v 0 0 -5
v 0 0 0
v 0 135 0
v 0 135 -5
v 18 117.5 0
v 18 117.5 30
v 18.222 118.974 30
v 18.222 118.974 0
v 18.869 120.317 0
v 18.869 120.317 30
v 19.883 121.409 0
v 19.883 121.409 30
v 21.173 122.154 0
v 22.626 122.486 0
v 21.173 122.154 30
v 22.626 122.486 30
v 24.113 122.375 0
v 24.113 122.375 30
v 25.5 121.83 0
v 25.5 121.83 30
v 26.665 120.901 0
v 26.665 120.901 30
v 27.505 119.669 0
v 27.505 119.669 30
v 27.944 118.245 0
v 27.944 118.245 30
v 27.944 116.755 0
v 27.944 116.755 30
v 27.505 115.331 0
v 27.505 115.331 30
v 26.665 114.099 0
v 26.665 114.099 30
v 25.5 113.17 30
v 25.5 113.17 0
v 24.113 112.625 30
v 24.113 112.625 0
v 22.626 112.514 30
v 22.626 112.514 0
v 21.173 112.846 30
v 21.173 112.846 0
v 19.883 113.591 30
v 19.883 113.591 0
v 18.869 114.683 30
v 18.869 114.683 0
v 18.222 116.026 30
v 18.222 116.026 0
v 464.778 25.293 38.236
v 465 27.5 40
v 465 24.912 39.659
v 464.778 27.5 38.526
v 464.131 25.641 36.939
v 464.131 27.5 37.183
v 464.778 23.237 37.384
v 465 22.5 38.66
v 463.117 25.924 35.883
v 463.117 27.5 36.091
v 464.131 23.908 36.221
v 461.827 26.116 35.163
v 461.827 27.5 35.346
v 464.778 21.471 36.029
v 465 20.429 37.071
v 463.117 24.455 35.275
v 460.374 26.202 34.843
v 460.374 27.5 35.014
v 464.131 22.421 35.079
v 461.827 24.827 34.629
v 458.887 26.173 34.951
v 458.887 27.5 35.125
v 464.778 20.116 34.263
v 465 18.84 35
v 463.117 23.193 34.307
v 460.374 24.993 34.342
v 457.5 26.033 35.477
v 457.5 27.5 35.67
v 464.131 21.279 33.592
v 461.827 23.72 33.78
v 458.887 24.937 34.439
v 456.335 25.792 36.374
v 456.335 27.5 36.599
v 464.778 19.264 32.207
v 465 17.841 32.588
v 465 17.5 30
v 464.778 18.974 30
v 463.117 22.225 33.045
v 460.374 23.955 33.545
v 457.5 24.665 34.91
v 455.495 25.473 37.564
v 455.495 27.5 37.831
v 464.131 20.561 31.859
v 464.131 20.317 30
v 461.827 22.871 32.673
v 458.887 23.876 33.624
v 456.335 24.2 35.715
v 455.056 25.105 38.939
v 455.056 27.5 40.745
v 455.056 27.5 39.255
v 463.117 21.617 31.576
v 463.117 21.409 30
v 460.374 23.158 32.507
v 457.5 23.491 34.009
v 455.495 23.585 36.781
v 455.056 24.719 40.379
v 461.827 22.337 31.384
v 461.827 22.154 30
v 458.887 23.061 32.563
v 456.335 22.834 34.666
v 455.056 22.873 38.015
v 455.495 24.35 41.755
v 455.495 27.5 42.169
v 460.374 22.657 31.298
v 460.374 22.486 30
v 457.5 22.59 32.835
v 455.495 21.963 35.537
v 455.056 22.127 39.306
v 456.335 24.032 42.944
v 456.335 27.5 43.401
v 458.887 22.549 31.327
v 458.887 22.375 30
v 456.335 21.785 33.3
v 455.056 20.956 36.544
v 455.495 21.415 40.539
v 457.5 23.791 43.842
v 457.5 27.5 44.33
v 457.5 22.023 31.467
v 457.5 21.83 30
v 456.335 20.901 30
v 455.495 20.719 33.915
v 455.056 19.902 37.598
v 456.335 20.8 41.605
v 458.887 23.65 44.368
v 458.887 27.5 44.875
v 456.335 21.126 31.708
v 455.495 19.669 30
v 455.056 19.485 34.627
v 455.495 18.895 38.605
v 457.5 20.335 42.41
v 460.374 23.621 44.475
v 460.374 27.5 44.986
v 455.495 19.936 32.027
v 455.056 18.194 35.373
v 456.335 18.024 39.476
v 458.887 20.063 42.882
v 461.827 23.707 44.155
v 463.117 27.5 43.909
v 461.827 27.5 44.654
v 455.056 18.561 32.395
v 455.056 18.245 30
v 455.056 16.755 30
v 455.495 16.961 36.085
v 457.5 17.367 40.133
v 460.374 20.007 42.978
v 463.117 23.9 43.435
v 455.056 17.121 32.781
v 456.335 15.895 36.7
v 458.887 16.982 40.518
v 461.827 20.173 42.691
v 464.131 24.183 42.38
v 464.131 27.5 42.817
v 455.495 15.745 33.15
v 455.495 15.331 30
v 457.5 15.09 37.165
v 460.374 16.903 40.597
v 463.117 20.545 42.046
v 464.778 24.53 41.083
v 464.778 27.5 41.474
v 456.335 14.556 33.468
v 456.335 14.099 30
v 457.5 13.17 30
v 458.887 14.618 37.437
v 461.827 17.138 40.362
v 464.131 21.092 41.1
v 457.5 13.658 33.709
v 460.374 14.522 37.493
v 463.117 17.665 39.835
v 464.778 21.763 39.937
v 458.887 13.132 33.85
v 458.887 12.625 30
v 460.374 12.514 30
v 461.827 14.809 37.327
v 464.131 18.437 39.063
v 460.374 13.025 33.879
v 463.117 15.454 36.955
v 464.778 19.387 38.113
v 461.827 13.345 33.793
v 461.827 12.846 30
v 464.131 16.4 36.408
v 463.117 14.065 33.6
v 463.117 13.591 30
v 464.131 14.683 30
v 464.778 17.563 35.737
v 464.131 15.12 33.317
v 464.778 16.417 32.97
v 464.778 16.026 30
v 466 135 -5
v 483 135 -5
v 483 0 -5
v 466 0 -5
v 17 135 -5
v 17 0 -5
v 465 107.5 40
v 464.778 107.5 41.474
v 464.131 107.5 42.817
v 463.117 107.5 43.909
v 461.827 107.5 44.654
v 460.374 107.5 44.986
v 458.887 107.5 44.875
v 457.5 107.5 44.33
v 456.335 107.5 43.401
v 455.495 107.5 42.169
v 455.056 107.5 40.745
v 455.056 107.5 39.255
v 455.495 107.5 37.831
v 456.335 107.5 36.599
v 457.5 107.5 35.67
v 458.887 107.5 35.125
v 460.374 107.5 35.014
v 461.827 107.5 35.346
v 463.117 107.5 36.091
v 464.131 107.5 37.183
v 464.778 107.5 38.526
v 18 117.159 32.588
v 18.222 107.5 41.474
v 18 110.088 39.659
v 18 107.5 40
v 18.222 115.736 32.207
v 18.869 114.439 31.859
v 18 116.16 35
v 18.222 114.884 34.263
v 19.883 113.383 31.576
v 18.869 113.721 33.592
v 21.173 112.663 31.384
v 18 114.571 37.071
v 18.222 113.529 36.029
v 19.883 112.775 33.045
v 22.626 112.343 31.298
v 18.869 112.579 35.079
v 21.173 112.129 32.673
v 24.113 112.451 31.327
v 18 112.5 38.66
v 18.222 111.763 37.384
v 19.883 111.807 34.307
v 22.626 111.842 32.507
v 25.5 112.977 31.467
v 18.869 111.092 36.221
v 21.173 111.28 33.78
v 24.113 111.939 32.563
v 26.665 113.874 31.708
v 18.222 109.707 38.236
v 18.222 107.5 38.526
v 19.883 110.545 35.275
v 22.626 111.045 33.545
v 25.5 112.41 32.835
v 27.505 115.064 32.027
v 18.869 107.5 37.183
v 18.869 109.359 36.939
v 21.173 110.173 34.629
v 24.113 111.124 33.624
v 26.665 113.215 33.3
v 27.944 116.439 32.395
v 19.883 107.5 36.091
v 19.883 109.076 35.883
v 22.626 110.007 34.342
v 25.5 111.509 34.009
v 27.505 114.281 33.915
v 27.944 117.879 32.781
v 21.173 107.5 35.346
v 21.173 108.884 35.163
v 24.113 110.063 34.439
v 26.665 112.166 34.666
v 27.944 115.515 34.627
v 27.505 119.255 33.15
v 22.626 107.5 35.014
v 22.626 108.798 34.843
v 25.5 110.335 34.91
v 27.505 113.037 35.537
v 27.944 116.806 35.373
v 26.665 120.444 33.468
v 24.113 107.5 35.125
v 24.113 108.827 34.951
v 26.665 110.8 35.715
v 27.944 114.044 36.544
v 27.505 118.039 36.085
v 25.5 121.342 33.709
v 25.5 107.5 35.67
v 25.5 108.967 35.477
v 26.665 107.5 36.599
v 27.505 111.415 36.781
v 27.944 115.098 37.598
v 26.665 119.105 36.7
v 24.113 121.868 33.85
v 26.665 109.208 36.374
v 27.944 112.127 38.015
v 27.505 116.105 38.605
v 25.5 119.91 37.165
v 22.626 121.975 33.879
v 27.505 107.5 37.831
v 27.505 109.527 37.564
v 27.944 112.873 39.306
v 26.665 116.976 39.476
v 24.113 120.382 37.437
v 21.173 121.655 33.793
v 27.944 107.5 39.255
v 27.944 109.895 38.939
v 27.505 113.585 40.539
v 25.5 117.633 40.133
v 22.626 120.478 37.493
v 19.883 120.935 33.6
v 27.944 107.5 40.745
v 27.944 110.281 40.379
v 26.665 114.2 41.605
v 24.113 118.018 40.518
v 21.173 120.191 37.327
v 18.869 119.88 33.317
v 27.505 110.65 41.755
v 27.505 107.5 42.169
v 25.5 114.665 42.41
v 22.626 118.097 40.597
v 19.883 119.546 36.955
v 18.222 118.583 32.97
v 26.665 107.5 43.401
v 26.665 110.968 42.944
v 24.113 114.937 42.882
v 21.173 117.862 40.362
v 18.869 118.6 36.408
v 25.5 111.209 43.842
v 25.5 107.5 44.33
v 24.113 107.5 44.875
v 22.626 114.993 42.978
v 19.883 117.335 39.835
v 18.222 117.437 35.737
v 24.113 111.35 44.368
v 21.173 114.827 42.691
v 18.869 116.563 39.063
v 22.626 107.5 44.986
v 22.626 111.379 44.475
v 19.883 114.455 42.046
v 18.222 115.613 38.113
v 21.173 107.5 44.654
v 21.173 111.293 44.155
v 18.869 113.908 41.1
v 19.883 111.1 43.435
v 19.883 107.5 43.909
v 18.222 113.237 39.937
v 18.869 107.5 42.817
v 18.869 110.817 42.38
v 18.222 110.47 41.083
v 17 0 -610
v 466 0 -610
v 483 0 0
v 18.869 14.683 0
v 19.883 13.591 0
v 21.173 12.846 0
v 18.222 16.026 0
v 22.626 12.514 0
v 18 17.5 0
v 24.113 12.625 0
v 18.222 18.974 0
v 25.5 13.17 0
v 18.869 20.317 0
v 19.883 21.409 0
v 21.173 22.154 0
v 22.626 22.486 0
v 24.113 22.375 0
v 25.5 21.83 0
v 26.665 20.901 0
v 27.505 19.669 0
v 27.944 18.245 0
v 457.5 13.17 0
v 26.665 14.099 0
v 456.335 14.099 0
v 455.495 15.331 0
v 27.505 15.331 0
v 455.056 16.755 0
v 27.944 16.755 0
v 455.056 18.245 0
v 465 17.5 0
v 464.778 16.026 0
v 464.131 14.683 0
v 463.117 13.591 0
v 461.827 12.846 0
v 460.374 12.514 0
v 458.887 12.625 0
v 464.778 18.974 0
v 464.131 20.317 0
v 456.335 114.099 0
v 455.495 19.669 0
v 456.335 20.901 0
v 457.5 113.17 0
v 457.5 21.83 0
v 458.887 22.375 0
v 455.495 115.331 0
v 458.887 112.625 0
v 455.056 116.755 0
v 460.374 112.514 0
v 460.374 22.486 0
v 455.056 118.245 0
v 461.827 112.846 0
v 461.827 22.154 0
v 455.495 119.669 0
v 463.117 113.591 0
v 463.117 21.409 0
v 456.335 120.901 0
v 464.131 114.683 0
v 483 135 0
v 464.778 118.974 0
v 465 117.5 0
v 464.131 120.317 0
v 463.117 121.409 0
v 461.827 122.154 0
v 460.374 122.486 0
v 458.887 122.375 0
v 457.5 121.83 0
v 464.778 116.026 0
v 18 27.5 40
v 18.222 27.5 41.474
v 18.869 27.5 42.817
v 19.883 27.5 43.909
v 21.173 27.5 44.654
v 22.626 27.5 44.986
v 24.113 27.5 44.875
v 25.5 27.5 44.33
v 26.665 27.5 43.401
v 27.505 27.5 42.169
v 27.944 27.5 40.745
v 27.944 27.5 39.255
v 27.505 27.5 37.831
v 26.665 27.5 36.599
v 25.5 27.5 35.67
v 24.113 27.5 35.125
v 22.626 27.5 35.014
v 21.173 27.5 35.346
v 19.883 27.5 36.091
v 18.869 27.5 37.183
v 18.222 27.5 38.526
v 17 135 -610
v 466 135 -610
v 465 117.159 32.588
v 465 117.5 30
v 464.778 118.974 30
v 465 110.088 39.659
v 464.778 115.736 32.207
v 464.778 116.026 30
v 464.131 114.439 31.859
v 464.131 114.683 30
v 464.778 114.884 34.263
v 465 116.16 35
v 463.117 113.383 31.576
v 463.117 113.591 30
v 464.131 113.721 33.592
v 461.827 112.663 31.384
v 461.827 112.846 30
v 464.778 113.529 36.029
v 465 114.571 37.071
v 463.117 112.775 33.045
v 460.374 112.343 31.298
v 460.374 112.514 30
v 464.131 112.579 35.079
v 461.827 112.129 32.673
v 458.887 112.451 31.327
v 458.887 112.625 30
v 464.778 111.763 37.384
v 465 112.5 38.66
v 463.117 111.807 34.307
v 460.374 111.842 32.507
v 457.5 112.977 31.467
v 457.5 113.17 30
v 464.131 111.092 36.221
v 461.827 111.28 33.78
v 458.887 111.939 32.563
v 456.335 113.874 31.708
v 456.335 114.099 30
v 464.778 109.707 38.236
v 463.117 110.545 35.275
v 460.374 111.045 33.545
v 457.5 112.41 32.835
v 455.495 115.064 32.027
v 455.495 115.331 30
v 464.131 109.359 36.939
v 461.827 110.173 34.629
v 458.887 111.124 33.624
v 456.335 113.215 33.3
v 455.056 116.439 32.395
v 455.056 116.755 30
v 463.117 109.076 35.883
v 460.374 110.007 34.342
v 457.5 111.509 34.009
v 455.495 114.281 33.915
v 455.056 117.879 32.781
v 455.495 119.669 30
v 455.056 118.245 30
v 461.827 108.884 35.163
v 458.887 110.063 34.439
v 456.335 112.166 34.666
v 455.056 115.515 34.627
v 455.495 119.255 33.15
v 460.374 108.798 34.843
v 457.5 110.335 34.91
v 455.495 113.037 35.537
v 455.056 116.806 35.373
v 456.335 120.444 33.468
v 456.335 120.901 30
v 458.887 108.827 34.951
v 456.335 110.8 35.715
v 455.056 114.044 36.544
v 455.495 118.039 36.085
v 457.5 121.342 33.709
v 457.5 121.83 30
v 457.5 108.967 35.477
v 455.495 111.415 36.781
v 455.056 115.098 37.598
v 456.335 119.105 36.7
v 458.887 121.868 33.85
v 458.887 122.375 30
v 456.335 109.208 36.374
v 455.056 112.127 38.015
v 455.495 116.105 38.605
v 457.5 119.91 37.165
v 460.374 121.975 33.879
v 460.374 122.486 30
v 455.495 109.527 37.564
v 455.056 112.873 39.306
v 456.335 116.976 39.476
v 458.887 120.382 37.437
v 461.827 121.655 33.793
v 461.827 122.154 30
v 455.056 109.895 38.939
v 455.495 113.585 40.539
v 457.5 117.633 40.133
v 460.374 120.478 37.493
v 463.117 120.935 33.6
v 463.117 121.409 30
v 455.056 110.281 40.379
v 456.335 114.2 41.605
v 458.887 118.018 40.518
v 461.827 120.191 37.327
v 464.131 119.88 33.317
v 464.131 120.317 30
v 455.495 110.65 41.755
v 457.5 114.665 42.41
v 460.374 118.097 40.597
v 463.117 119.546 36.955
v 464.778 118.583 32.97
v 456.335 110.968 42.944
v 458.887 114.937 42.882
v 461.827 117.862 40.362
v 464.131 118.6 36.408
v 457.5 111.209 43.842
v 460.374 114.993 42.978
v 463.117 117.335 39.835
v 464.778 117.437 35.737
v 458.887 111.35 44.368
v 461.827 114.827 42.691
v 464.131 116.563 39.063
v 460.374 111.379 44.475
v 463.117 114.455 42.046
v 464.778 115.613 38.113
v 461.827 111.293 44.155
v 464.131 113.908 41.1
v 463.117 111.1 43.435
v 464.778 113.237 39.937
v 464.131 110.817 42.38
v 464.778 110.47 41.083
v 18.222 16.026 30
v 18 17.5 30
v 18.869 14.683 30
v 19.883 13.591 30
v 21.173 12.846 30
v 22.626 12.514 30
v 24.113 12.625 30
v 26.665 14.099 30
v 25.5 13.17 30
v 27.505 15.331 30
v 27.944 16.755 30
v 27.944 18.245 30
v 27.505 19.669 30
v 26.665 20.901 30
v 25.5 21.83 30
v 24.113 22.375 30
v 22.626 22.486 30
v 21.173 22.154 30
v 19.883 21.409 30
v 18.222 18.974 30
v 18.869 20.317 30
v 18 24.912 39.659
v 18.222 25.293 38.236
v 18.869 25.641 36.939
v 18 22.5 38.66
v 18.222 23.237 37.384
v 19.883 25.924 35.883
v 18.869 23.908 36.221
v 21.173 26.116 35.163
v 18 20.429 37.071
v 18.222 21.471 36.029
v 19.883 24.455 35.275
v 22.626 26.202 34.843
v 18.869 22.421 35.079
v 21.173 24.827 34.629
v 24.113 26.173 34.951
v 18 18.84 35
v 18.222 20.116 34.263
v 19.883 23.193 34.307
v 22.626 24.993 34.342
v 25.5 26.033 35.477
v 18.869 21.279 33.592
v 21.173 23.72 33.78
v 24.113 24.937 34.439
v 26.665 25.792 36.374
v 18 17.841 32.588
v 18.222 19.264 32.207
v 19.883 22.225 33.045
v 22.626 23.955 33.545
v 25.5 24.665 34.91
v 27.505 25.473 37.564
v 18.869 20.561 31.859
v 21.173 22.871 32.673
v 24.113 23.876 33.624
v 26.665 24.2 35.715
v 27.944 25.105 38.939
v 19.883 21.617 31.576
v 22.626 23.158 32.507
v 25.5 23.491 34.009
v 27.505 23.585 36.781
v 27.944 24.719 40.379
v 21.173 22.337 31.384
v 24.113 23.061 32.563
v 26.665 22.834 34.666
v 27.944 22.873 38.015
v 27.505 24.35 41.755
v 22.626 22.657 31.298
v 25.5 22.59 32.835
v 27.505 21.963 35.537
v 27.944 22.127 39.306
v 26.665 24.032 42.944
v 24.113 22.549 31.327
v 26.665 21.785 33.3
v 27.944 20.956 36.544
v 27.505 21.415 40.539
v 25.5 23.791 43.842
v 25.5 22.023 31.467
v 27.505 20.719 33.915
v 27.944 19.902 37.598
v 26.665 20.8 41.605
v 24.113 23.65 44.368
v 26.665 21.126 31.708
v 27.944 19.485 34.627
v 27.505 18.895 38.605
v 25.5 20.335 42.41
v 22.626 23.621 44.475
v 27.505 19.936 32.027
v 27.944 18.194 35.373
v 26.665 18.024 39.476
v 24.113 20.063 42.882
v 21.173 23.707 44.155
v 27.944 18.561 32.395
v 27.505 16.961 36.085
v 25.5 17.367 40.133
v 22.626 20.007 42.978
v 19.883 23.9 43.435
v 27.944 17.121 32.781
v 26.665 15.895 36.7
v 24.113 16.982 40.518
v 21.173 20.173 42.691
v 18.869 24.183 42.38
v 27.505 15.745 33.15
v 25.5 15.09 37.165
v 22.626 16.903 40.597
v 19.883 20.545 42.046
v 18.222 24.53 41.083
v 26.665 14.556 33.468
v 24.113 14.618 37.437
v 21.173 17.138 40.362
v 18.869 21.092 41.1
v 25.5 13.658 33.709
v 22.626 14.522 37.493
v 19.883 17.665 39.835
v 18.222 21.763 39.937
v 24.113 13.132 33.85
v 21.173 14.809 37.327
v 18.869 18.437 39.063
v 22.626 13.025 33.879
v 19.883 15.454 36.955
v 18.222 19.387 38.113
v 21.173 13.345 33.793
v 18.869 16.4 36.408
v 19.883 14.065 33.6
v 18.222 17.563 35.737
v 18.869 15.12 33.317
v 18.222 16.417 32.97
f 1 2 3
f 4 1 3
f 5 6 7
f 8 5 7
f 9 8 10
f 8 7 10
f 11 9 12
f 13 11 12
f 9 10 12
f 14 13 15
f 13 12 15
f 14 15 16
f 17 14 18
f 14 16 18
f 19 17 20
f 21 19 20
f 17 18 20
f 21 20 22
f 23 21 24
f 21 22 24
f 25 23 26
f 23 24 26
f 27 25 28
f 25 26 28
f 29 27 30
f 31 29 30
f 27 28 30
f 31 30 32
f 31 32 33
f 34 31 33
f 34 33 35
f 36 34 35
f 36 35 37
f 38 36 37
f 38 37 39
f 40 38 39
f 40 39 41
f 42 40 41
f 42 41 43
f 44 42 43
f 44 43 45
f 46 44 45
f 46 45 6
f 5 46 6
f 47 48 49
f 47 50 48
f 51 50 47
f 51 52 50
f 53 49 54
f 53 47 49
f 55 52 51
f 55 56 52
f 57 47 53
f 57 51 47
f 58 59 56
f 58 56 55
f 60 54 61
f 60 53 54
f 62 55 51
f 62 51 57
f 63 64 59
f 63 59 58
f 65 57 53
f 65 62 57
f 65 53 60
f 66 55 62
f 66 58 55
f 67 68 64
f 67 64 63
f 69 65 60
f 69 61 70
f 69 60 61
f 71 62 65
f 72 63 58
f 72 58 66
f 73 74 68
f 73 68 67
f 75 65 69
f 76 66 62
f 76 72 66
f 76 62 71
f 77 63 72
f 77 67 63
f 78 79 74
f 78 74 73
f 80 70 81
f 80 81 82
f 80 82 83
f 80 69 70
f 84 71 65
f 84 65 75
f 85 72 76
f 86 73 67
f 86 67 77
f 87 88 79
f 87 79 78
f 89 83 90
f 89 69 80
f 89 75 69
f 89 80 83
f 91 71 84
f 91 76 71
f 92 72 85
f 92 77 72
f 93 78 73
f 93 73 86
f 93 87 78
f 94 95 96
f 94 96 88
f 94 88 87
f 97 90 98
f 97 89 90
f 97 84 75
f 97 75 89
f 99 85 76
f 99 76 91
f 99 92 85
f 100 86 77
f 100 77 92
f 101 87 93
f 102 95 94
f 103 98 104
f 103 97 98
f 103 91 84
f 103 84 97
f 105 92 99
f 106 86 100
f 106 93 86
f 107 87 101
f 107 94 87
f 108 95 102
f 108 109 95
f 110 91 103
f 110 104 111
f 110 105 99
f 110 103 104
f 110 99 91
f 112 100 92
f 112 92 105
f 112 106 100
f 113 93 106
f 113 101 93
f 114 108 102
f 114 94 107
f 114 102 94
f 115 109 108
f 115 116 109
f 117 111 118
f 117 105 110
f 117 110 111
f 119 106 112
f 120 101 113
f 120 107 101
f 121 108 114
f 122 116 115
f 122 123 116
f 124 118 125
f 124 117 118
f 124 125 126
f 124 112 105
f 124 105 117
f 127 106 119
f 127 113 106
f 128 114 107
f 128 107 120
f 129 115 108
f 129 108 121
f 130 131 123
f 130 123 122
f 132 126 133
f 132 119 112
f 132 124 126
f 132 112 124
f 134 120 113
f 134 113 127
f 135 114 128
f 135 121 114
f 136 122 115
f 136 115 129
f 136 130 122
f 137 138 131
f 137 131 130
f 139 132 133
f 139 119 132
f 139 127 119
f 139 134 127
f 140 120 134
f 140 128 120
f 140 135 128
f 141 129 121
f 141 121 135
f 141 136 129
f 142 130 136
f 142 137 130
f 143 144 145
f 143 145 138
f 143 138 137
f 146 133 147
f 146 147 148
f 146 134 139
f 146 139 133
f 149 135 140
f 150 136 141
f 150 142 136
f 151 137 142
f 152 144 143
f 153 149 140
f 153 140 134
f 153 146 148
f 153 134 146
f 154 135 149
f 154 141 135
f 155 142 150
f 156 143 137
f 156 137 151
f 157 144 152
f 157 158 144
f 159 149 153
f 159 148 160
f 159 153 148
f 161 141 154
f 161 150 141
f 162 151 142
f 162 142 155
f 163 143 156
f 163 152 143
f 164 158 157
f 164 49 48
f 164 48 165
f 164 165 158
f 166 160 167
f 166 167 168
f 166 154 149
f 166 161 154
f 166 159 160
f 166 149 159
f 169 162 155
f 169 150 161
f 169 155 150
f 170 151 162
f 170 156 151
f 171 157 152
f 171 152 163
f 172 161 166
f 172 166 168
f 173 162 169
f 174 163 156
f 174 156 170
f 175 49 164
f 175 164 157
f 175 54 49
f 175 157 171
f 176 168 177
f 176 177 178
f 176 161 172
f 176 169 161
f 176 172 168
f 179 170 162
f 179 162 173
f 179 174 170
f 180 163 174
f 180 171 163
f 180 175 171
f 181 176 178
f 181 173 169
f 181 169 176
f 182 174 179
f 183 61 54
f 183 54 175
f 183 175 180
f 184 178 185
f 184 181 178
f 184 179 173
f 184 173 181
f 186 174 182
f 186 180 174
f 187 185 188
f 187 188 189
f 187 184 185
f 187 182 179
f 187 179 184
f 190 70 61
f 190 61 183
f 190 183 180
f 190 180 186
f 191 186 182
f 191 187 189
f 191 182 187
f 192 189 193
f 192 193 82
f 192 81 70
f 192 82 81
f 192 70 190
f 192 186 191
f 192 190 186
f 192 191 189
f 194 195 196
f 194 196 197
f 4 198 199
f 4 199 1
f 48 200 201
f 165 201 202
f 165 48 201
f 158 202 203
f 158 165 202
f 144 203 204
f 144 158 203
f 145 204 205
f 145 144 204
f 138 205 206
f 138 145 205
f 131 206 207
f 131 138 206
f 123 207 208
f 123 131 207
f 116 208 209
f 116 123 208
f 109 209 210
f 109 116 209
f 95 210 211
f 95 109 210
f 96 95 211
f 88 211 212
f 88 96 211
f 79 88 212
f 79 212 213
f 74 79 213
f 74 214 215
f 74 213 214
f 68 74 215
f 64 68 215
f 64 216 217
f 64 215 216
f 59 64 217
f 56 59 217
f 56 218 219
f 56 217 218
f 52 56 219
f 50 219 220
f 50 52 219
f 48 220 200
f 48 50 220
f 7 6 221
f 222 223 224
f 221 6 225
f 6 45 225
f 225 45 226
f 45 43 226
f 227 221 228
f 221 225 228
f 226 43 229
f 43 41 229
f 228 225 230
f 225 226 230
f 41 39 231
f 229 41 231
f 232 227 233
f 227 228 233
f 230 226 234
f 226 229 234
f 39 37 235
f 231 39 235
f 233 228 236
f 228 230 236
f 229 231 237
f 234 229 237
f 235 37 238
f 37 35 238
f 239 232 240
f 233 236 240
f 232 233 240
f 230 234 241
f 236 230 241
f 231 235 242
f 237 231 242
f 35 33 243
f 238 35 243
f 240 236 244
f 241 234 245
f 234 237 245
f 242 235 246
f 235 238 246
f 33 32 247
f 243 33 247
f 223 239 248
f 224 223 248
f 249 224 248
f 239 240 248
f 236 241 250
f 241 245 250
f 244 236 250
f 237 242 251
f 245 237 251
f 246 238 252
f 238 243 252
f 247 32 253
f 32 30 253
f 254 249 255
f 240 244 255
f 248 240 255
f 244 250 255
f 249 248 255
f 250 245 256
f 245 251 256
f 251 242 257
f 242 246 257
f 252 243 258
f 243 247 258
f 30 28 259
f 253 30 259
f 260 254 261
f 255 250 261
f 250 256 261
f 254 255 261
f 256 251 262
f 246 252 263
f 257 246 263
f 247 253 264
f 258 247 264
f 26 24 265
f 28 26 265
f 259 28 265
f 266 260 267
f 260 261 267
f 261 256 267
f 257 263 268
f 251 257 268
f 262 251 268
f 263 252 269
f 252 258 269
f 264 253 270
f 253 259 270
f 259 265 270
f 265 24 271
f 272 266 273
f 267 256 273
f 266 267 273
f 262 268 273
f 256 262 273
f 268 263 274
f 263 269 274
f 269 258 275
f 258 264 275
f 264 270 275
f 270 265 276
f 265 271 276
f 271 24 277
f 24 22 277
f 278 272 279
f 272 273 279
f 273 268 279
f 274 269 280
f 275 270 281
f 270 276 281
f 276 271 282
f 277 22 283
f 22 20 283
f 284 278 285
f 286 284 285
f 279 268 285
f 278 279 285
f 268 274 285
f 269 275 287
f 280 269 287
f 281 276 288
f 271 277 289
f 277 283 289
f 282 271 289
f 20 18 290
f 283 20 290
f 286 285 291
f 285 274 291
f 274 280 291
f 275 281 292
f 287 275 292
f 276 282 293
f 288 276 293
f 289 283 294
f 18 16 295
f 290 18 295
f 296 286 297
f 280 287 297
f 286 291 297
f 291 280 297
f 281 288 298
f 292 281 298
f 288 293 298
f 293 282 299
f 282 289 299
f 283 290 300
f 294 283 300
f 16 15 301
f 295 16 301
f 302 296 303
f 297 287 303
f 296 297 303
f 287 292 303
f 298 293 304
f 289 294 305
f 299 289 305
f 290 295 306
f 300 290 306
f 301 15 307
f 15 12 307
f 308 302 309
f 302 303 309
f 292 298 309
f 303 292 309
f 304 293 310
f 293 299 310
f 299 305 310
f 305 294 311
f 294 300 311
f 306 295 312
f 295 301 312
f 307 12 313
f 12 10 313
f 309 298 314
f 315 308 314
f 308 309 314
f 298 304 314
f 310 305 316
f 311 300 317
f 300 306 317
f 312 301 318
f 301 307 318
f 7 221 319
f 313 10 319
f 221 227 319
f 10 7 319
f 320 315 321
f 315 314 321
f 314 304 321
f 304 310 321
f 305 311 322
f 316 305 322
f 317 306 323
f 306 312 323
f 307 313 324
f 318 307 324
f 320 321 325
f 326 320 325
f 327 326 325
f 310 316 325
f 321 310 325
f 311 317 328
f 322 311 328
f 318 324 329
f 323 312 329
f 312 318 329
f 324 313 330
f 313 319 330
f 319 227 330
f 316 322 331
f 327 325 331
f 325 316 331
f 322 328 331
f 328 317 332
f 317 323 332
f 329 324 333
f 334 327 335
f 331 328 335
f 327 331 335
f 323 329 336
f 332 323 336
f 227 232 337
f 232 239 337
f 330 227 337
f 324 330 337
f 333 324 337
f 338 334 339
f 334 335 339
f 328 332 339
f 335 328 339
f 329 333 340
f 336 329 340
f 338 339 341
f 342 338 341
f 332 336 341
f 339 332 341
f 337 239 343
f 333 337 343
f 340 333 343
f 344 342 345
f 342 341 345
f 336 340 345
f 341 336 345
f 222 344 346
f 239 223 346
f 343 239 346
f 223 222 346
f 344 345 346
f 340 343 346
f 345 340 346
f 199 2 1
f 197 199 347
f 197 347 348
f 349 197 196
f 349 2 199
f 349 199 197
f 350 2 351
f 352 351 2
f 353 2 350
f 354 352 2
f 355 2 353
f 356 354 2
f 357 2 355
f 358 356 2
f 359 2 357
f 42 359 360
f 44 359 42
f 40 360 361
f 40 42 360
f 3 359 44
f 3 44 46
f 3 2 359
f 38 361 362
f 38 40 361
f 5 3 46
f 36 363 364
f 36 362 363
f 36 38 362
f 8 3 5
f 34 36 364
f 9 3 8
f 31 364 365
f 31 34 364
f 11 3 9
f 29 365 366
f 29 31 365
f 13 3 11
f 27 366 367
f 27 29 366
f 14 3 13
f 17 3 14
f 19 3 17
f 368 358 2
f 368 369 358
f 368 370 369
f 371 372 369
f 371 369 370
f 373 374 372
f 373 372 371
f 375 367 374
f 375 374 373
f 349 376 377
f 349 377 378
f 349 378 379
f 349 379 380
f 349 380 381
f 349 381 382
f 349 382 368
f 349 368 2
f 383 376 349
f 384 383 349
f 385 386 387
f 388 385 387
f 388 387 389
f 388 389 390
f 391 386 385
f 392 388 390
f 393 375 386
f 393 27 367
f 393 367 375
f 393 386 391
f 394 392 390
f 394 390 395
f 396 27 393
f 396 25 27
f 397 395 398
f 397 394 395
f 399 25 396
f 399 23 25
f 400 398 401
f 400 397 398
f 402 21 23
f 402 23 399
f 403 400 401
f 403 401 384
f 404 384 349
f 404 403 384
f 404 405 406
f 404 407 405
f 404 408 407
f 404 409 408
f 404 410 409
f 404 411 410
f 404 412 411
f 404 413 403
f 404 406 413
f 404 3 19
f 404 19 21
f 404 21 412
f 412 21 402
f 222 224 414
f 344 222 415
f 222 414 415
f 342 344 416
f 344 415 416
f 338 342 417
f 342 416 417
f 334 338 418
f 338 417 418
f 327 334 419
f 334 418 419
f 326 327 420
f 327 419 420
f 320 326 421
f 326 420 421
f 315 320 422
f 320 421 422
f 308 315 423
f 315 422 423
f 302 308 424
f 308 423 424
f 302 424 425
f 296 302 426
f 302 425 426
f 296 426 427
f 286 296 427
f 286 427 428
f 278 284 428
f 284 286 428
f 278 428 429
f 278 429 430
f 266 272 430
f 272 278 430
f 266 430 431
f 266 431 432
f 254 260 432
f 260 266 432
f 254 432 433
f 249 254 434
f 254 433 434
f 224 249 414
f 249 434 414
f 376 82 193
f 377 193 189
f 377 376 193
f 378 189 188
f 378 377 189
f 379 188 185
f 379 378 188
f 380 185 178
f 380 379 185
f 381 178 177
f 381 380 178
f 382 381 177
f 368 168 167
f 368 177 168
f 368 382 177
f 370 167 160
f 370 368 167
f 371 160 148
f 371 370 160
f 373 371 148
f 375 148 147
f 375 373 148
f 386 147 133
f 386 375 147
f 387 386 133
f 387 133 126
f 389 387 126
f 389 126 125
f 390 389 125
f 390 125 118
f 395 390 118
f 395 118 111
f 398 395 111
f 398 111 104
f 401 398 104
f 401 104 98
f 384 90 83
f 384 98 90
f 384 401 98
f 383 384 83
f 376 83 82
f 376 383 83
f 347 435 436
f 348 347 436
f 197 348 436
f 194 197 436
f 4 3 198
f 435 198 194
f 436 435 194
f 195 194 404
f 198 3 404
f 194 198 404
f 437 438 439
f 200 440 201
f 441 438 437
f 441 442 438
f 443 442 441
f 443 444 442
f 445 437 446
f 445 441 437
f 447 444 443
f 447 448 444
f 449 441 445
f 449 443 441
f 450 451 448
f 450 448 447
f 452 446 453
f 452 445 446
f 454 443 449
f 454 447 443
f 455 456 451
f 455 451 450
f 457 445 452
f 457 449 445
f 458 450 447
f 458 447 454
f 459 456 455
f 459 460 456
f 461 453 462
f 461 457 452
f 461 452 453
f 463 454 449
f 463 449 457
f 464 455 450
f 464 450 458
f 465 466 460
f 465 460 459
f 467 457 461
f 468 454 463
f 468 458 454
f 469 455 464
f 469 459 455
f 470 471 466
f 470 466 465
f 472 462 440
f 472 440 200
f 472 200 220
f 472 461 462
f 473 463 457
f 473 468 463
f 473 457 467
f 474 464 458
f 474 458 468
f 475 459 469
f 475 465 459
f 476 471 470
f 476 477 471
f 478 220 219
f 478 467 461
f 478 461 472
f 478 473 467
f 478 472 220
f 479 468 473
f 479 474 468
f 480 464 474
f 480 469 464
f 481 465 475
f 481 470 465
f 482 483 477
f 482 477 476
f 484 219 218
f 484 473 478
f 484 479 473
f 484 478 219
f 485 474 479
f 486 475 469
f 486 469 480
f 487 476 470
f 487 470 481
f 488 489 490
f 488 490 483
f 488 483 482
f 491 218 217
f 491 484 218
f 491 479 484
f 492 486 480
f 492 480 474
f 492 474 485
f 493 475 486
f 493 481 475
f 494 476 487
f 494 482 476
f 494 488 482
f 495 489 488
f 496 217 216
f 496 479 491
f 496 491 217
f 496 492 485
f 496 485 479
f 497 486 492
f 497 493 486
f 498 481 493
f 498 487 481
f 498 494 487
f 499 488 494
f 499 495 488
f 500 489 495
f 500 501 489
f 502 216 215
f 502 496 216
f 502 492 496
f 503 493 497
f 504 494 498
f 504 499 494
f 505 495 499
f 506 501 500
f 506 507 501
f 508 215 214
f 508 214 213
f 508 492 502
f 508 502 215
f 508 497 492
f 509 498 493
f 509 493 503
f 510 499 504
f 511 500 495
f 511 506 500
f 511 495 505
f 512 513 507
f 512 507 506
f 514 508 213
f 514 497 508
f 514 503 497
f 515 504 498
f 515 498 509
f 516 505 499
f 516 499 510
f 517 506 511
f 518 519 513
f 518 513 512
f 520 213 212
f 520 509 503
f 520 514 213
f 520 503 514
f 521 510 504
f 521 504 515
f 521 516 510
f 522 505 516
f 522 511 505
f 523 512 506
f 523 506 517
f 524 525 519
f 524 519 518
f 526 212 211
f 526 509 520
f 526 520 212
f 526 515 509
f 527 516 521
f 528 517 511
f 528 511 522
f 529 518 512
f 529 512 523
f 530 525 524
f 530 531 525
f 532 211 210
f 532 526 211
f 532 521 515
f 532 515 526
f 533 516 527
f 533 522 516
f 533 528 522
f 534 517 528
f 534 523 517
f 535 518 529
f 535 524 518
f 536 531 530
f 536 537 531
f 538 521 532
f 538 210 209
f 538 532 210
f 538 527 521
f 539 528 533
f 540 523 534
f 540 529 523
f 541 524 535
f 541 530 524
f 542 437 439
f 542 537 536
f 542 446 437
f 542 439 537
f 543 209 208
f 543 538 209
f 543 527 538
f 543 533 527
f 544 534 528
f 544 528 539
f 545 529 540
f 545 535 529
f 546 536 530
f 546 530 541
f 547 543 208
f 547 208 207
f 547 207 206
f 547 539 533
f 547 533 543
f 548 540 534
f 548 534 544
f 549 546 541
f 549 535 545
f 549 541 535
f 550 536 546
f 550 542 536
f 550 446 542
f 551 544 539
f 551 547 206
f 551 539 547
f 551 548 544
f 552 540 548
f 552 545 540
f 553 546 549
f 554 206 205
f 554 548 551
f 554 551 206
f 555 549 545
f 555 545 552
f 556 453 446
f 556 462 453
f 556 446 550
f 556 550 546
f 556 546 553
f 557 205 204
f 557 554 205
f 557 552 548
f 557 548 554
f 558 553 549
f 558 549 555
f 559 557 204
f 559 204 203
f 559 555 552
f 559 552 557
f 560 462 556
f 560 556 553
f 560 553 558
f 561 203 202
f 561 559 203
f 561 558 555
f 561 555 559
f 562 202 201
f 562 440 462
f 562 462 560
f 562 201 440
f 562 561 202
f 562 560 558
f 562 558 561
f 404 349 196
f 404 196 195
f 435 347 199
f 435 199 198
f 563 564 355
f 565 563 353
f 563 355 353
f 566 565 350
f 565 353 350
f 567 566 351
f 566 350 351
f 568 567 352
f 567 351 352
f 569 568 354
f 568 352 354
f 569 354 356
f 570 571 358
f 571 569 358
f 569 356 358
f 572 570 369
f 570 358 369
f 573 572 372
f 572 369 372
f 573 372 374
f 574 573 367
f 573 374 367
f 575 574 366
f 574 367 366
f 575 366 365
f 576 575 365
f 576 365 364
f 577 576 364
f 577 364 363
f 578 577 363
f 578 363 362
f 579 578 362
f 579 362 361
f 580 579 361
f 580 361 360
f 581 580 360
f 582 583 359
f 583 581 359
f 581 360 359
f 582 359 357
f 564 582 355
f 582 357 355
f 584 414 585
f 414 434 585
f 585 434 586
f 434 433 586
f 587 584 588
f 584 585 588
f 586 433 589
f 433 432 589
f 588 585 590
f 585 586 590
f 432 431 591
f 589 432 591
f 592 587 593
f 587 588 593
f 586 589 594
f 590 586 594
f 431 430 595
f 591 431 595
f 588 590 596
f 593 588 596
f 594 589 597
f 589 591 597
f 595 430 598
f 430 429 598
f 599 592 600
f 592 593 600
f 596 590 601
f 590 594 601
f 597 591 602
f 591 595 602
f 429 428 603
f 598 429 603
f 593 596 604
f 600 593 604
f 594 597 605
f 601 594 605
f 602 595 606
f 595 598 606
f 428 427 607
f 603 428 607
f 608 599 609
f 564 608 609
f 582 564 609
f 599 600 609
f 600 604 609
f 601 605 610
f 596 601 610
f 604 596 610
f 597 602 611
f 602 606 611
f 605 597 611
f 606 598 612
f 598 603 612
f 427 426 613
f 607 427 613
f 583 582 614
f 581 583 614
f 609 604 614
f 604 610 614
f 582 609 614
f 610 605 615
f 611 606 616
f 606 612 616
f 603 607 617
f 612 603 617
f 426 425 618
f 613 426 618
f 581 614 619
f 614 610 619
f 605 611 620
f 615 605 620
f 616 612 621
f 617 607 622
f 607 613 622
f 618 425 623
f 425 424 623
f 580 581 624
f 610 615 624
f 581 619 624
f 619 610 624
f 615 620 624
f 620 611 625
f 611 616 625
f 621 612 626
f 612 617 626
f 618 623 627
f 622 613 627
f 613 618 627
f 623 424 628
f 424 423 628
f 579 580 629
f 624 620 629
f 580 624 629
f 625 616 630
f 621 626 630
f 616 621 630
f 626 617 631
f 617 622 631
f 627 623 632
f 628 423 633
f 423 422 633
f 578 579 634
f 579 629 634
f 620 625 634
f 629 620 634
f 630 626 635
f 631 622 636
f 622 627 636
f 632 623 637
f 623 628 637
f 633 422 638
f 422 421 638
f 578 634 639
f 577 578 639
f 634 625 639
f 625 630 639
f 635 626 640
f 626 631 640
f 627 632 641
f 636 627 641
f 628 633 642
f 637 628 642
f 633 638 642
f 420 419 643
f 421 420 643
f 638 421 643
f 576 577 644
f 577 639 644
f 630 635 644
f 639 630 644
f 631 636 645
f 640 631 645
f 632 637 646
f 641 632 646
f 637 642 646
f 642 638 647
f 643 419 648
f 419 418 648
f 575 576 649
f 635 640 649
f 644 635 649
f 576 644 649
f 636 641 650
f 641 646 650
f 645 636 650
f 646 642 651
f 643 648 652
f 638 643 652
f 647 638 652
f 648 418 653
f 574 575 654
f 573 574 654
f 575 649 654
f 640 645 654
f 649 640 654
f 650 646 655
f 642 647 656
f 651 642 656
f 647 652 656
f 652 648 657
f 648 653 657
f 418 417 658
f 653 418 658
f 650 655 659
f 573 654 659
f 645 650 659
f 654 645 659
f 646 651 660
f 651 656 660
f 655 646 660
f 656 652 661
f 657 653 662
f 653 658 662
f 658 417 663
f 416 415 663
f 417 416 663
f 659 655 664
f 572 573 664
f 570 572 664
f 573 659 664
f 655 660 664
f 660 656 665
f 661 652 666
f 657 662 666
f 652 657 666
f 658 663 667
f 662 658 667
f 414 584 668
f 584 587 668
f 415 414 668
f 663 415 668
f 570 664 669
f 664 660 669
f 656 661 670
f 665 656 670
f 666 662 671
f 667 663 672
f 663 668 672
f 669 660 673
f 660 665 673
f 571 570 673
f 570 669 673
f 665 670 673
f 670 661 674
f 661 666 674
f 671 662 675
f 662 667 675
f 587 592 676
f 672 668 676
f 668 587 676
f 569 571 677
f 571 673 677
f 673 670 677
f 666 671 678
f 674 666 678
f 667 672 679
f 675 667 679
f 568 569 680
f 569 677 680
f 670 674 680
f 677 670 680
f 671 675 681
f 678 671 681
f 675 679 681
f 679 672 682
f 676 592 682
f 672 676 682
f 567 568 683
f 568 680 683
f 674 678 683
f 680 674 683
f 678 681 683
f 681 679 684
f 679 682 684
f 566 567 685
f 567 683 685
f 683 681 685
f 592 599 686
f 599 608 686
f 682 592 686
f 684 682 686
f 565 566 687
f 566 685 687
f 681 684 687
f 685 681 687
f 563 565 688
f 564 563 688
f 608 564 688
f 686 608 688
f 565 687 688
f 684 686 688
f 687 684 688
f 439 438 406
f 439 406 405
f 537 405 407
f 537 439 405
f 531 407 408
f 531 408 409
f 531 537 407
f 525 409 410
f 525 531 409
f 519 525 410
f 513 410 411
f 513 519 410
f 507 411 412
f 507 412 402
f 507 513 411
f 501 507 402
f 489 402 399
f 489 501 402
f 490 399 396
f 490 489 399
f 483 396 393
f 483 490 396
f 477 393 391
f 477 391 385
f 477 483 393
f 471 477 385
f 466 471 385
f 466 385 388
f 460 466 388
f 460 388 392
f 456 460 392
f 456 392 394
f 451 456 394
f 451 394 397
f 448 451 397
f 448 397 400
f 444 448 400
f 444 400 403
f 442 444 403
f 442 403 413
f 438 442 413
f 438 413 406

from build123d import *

# Parameters (mm, degrees)
SKETCH1_W           = 483
SKETCH1_H           = 135
BOSS_EXTRUDE1_DEPTH = 610
SKETCH2_W           = 17
SKETCH2_H           = 135
CUT_EXTRUDE1_DEPTH  = 605
SKETCH4_R           = 5


with BuildPart() as part:
    # Sketch1 → Boss-Extrude1 (new body)
    with BuildSketch(Plane.XY):
        with Locations((241.5, 67.5)):
            Rectangle(SKETCH1_W, SKETCH1_H)
    extrude(amount=-BOSS_EXTRUDE1_DEPTH)

    # Sketch2 → Cut-Extrude1 (cut)
    with BuildSketch(Plane(origin=(0, 0, -610), x_dir=(-1, 0, 0), z_dir=(0, 0, -1))):
        with Locations((-474.5, 67.5)):
            Rectangle(SKETCH2_W, SKETCH2_H)
        with Locations((-8.5, 67.5)):
            Rectangle(SKETCH2_W, SKETCH2_H)
    extrude(amount=-CUT_EXTRUDE1_DEPTH, mode=Mode.SUBTRACT)

    # Sweep1: sweep along a path in Sketch3
    with BuildLine(Plane(origin=(460, 0, 0), x_dir=(0, 0, -1), z_dir=(1, 0, 0))) as sweep1_path:
        Line((0, 117.5), (-30, 117.5))
        ThreePointArc((-30, 117.5), (-37.071067812, 114.571067812), (-40, 107.5))
        Line((-40, 107.5), (-40, 27.5))
        ThreePointArc((-40, 27.5), (-37.071067812, 20.428932188), (-30, 17.5))
        Line((-30, 17.5), (0, 17.5))
    # Sketch4 → Sweep1 (sweep)
    with BuildSketch(Plane.XY):
        with Locations((460, 117.5)):
            Circle(SKETCH4_R)
    sweep1 = sweep(path=sweep1_path.line)

    # Mirror1: Sweep1 across plane
    add(sweep1.mirror(Plane(origin=(241.5, 0, 0), x_dir=(0, 0, 1), z_dir=(1, 0, 0))))


solid = part.part
